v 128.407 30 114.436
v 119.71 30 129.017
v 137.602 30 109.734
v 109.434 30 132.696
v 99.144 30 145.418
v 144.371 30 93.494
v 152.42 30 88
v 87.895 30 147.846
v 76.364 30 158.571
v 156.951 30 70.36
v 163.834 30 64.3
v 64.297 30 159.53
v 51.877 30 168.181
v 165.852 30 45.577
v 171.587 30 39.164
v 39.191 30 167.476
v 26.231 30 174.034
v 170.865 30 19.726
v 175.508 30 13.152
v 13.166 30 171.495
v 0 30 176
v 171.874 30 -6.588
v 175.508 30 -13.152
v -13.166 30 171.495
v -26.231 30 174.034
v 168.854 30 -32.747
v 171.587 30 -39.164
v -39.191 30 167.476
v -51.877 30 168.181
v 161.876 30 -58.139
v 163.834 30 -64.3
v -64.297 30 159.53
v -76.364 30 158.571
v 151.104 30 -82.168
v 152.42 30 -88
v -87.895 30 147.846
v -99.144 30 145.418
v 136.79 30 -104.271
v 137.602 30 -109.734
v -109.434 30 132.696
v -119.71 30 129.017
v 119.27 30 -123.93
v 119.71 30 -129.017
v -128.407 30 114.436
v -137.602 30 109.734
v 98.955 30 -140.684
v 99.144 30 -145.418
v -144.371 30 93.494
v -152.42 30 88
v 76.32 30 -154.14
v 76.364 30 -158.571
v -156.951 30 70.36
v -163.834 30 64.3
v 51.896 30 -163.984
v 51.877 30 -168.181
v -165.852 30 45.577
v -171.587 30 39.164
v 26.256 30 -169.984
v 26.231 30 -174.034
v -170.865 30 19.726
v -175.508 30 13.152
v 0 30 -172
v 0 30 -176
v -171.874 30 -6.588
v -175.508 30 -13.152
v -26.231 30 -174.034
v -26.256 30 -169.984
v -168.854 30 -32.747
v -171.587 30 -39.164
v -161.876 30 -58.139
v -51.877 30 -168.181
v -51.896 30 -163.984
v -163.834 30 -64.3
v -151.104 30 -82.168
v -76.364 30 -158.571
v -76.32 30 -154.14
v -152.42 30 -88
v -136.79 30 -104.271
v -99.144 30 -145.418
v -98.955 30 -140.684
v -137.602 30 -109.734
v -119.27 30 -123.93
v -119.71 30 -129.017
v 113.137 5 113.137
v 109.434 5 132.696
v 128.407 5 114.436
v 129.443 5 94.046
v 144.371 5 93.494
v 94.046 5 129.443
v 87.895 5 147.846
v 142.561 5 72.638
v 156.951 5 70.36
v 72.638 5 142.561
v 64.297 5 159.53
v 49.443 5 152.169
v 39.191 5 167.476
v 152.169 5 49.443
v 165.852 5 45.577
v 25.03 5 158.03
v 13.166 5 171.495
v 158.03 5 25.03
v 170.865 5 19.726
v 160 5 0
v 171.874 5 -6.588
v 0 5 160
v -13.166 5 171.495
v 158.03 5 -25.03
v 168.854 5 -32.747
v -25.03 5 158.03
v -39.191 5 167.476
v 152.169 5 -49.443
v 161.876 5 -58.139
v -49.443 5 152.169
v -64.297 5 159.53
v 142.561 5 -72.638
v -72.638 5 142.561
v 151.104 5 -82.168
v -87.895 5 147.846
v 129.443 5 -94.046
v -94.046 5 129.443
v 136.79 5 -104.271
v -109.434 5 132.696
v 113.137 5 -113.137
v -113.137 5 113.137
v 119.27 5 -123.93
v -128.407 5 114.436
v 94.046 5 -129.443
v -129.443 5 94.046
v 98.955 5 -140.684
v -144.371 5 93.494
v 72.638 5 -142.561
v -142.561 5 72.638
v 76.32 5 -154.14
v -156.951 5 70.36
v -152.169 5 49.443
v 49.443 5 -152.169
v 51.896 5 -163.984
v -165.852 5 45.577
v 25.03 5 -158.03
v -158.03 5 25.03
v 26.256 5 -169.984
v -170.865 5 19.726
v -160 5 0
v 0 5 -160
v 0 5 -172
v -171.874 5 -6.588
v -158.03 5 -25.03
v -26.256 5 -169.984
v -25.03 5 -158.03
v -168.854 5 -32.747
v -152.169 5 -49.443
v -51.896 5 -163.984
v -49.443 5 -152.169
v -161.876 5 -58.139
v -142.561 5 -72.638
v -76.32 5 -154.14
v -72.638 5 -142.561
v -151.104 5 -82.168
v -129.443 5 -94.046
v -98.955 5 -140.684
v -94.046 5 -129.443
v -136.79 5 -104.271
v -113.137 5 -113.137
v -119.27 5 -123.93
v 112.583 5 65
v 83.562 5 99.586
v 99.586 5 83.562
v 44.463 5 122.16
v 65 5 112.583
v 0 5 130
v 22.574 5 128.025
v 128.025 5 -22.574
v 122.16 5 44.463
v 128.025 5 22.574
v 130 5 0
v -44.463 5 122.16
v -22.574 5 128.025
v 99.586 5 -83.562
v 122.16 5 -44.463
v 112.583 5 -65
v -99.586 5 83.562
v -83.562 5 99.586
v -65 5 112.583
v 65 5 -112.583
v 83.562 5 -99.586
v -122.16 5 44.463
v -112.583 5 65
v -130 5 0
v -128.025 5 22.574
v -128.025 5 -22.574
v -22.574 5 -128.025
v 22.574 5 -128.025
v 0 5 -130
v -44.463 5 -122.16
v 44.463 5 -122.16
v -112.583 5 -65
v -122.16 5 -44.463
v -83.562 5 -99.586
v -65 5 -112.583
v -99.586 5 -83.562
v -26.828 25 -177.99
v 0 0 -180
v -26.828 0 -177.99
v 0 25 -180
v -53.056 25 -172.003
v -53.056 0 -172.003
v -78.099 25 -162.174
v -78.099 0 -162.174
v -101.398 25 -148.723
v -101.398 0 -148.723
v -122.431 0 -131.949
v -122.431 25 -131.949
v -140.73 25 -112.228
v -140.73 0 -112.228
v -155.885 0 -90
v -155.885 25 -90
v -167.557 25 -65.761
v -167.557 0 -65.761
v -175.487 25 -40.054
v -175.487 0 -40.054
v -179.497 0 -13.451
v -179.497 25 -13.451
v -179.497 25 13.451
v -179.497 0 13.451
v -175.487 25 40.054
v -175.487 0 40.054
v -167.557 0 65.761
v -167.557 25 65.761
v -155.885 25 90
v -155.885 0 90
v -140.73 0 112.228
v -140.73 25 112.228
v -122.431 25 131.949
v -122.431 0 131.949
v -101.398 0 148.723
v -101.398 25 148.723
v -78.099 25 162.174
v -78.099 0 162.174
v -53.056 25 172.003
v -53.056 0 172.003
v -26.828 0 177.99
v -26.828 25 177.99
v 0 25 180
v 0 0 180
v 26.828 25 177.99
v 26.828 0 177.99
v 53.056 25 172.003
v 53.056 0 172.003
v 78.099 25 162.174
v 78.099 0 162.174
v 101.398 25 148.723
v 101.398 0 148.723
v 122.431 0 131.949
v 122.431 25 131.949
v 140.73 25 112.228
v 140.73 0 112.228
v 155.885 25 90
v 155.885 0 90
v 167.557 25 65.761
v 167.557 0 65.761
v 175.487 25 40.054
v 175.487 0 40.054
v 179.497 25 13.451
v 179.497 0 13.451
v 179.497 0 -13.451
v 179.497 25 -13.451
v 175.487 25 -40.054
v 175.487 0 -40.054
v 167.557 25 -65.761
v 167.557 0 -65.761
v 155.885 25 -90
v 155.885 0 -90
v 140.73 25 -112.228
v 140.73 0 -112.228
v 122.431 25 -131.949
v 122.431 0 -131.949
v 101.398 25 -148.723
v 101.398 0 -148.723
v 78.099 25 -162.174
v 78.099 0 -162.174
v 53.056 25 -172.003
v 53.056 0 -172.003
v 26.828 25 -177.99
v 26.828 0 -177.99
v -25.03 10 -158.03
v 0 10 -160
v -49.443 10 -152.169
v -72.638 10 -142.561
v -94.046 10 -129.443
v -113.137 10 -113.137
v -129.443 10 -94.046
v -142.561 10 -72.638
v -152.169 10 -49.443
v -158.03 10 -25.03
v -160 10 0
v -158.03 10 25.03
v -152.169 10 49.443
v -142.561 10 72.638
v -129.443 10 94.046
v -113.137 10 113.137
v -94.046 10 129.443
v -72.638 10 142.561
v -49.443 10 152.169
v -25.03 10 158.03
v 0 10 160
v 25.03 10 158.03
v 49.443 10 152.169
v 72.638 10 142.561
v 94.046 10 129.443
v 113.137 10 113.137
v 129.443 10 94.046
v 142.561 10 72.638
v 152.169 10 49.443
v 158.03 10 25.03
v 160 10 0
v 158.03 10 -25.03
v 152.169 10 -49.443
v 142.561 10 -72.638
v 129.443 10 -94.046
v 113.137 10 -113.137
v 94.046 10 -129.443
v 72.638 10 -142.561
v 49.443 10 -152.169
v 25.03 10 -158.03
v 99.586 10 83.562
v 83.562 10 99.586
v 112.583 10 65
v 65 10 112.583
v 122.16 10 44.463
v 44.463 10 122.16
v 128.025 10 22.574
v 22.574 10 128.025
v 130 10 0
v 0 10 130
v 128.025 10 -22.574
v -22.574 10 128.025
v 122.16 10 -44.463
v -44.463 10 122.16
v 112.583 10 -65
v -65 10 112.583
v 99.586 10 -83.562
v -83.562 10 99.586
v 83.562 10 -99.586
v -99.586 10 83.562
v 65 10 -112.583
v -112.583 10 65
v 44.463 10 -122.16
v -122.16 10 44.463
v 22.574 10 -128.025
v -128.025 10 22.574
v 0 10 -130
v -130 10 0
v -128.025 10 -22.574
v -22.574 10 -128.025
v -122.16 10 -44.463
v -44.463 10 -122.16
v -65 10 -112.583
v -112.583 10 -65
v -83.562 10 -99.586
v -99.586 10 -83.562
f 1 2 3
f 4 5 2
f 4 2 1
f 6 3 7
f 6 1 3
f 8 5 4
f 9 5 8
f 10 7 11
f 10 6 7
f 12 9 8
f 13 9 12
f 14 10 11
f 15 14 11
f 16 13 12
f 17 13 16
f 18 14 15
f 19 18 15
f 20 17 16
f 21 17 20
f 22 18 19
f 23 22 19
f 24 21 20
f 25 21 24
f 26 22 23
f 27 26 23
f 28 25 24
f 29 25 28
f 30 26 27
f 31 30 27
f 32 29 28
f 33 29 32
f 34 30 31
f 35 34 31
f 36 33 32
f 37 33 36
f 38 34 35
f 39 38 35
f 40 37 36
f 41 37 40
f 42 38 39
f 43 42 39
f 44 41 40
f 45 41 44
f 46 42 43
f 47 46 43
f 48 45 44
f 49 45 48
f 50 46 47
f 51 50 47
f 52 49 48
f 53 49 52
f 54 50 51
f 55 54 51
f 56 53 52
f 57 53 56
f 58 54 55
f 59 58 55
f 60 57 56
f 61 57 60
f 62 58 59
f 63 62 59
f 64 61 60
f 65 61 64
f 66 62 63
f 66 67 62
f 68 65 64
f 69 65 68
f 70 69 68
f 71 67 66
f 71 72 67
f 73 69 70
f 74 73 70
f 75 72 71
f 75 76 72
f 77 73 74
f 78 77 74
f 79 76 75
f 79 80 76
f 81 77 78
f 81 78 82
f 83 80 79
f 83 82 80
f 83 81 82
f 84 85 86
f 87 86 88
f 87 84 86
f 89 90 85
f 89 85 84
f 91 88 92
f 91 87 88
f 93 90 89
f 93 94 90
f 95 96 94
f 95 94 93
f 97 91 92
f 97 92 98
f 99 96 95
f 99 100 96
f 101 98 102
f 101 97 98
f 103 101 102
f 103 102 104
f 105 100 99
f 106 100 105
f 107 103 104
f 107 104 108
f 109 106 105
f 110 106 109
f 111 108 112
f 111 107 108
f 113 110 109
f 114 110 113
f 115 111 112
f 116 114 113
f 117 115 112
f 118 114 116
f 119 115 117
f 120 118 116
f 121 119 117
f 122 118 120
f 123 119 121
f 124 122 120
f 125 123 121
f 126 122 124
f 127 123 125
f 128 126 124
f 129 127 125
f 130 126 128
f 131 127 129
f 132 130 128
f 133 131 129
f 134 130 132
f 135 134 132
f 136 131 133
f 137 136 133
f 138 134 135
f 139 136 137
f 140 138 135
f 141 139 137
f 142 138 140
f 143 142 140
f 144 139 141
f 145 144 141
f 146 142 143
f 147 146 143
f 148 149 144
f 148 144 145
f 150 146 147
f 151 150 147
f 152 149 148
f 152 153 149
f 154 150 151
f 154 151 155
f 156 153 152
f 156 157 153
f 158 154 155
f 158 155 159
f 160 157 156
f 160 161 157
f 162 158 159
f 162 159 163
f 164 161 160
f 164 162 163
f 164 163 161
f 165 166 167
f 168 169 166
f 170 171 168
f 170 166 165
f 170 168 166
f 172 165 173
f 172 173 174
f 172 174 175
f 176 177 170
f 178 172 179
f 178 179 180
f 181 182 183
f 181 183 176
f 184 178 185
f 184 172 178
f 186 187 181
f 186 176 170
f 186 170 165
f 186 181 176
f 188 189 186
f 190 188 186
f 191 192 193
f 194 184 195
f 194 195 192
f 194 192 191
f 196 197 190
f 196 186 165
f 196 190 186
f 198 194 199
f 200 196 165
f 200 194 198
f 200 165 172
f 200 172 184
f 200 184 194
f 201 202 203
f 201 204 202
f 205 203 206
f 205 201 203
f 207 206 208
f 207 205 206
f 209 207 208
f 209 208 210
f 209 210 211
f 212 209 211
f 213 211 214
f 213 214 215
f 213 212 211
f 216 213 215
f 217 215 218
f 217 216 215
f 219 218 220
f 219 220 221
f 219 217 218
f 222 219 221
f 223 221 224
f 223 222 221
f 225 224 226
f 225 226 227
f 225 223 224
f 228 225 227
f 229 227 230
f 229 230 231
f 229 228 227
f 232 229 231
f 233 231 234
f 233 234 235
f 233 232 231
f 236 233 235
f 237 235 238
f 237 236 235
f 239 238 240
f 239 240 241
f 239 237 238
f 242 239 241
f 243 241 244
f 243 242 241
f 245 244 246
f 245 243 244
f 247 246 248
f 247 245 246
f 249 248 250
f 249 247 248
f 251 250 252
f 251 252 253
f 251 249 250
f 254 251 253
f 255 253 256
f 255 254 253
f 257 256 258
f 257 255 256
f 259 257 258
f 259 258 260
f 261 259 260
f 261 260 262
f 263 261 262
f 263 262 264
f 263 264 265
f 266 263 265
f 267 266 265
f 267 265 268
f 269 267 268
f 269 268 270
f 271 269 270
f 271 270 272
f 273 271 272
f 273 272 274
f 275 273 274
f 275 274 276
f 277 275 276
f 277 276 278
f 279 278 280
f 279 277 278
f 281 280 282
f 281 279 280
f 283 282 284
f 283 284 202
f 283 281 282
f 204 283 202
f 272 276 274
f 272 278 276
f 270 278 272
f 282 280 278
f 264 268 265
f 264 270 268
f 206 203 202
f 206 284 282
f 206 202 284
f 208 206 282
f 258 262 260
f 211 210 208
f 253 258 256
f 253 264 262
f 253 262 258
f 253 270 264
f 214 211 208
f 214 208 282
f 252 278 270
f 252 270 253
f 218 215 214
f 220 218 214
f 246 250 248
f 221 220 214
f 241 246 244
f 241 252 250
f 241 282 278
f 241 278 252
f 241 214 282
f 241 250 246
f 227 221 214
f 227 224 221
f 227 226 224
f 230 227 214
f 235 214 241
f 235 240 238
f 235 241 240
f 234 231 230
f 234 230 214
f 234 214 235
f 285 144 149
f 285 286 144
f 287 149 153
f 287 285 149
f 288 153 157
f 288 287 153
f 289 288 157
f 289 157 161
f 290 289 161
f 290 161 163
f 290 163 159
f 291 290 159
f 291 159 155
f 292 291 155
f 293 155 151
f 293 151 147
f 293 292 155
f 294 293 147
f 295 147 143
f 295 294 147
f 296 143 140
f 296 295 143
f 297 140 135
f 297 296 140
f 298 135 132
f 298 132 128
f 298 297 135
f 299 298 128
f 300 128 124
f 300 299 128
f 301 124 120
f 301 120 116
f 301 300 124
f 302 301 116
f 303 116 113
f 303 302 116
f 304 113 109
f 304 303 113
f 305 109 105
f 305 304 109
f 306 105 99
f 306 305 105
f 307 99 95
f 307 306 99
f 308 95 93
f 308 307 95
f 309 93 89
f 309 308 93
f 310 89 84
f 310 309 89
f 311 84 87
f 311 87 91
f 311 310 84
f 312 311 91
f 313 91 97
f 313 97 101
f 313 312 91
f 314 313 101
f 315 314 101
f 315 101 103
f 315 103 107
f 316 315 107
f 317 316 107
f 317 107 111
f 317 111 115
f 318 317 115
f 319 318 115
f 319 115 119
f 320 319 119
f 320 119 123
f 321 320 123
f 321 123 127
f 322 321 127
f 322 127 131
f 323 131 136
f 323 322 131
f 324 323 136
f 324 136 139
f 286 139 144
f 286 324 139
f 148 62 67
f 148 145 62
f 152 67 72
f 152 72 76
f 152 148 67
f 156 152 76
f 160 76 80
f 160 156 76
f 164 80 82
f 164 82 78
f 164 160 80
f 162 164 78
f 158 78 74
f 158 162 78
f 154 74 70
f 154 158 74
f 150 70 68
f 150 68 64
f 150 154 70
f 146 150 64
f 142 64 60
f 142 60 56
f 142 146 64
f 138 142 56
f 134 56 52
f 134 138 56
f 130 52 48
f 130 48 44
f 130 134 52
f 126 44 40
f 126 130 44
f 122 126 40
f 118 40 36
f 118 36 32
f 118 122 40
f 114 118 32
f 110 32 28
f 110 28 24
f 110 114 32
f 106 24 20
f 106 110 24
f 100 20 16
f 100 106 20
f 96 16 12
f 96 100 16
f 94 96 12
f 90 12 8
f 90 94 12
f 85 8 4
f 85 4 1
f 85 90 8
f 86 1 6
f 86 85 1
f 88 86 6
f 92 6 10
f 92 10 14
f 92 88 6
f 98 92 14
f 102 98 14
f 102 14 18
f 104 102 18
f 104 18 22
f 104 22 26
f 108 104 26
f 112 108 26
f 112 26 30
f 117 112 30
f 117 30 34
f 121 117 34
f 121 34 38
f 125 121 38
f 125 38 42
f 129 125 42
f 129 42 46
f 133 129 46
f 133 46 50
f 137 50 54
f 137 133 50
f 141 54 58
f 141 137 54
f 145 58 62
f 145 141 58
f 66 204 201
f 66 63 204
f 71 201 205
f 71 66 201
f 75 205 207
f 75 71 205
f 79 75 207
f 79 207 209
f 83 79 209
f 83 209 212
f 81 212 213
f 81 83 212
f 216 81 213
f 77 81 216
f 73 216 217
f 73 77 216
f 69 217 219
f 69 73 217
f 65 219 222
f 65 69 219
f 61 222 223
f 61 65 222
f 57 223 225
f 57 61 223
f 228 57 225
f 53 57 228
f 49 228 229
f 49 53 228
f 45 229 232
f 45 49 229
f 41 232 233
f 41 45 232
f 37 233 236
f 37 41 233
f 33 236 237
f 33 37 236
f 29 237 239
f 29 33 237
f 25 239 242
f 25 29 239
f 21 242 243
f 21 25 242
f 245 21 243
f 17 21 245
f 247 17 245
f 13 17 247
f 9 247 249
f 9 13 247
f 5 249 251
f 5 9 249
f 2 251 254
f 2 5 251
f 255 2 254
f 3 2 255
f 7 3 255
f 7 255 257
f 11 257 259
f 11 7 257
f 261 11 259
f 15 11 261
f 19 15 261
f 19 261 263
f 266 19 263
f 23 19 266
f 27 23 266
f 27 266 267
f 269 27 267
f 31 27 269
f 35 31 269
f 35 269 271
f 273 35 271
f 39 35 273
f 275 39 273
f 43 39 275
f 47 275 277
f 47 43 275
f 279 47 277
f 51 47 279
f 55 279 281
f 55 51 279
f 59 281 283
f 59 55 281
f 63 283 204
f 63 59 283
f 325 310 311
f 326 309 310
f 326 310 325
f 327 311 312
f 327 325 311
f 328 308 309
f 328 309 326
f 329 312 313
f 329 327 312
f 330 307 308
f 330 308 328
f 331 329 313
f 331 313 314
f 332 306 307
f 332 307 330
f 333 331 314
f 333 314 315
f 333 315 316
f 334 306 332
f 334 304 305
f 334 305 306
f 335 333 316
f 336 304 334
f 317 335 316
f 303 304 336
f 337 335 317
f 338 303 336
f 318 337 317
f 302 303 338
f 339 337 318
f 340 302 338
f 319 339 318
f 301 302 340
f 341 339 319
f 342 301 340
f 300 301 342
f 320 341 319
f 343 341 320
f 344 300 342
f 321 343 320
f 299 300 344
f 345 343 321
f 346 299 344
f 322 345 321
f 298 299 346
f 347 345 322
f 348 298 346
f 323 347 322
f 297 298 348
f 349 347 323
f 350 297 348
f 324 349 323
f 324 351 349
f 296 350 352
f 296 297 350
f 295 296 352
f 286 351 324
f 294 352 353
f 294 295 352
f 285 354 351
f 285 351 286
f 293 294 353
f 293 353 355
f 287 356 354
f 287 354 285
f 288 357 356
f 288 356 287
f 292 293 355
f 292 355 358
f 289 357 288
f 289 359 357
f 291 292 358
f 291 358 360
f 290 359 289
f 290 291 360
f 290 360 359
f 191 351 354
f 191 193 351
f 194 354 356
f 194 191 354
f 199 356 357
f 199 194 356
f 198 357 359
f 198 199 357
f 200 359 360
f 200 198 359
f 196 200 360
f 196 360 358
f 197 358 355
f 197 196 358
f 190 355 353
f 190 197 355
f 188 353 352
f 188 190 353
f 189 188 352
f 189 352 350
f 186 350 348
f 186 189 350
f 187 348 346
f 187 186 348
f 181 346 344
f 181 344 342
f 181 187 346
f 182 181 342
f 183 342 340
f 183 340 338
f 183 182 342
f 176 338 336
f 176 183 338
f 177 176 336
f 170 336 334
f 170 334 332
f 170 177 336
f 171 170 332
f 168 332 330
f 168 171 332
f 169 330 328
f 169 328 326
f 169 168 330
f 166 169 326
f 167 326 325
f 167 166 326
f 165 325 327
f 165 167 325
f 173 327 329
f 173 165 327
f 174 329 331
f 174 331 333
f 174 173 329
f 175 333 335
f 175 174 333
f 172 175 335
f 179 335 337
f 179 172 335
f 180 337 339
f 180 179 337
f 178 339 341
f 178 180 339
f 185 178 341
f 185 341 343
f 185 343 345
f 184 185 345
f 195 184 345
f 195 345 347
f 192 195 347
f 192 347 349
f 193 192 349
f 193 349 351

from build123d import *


with BuildPart() as part:
    # Sketch1 → Removable Drainage Saucer (revolve)
    with BuildSketch(Plane.XY, mode=Mode.PRIVATE) as removable_drainage_saucer_sk:
        Polygon((0, 0), (180, 0), (180, 25), (176, 30), (172, 30), (172, 5), (160, 5), (160, 10), (130, 10), (130, 5), (0, 5), align=None)
    revolve(removable_drainage_saucer_sk.sketch.rotate(Axis((0, -10, 0), (0, 1, 0)), 90), axis=Axis((0, -10, 0), (0, 1, 0)))


solid = part.part
